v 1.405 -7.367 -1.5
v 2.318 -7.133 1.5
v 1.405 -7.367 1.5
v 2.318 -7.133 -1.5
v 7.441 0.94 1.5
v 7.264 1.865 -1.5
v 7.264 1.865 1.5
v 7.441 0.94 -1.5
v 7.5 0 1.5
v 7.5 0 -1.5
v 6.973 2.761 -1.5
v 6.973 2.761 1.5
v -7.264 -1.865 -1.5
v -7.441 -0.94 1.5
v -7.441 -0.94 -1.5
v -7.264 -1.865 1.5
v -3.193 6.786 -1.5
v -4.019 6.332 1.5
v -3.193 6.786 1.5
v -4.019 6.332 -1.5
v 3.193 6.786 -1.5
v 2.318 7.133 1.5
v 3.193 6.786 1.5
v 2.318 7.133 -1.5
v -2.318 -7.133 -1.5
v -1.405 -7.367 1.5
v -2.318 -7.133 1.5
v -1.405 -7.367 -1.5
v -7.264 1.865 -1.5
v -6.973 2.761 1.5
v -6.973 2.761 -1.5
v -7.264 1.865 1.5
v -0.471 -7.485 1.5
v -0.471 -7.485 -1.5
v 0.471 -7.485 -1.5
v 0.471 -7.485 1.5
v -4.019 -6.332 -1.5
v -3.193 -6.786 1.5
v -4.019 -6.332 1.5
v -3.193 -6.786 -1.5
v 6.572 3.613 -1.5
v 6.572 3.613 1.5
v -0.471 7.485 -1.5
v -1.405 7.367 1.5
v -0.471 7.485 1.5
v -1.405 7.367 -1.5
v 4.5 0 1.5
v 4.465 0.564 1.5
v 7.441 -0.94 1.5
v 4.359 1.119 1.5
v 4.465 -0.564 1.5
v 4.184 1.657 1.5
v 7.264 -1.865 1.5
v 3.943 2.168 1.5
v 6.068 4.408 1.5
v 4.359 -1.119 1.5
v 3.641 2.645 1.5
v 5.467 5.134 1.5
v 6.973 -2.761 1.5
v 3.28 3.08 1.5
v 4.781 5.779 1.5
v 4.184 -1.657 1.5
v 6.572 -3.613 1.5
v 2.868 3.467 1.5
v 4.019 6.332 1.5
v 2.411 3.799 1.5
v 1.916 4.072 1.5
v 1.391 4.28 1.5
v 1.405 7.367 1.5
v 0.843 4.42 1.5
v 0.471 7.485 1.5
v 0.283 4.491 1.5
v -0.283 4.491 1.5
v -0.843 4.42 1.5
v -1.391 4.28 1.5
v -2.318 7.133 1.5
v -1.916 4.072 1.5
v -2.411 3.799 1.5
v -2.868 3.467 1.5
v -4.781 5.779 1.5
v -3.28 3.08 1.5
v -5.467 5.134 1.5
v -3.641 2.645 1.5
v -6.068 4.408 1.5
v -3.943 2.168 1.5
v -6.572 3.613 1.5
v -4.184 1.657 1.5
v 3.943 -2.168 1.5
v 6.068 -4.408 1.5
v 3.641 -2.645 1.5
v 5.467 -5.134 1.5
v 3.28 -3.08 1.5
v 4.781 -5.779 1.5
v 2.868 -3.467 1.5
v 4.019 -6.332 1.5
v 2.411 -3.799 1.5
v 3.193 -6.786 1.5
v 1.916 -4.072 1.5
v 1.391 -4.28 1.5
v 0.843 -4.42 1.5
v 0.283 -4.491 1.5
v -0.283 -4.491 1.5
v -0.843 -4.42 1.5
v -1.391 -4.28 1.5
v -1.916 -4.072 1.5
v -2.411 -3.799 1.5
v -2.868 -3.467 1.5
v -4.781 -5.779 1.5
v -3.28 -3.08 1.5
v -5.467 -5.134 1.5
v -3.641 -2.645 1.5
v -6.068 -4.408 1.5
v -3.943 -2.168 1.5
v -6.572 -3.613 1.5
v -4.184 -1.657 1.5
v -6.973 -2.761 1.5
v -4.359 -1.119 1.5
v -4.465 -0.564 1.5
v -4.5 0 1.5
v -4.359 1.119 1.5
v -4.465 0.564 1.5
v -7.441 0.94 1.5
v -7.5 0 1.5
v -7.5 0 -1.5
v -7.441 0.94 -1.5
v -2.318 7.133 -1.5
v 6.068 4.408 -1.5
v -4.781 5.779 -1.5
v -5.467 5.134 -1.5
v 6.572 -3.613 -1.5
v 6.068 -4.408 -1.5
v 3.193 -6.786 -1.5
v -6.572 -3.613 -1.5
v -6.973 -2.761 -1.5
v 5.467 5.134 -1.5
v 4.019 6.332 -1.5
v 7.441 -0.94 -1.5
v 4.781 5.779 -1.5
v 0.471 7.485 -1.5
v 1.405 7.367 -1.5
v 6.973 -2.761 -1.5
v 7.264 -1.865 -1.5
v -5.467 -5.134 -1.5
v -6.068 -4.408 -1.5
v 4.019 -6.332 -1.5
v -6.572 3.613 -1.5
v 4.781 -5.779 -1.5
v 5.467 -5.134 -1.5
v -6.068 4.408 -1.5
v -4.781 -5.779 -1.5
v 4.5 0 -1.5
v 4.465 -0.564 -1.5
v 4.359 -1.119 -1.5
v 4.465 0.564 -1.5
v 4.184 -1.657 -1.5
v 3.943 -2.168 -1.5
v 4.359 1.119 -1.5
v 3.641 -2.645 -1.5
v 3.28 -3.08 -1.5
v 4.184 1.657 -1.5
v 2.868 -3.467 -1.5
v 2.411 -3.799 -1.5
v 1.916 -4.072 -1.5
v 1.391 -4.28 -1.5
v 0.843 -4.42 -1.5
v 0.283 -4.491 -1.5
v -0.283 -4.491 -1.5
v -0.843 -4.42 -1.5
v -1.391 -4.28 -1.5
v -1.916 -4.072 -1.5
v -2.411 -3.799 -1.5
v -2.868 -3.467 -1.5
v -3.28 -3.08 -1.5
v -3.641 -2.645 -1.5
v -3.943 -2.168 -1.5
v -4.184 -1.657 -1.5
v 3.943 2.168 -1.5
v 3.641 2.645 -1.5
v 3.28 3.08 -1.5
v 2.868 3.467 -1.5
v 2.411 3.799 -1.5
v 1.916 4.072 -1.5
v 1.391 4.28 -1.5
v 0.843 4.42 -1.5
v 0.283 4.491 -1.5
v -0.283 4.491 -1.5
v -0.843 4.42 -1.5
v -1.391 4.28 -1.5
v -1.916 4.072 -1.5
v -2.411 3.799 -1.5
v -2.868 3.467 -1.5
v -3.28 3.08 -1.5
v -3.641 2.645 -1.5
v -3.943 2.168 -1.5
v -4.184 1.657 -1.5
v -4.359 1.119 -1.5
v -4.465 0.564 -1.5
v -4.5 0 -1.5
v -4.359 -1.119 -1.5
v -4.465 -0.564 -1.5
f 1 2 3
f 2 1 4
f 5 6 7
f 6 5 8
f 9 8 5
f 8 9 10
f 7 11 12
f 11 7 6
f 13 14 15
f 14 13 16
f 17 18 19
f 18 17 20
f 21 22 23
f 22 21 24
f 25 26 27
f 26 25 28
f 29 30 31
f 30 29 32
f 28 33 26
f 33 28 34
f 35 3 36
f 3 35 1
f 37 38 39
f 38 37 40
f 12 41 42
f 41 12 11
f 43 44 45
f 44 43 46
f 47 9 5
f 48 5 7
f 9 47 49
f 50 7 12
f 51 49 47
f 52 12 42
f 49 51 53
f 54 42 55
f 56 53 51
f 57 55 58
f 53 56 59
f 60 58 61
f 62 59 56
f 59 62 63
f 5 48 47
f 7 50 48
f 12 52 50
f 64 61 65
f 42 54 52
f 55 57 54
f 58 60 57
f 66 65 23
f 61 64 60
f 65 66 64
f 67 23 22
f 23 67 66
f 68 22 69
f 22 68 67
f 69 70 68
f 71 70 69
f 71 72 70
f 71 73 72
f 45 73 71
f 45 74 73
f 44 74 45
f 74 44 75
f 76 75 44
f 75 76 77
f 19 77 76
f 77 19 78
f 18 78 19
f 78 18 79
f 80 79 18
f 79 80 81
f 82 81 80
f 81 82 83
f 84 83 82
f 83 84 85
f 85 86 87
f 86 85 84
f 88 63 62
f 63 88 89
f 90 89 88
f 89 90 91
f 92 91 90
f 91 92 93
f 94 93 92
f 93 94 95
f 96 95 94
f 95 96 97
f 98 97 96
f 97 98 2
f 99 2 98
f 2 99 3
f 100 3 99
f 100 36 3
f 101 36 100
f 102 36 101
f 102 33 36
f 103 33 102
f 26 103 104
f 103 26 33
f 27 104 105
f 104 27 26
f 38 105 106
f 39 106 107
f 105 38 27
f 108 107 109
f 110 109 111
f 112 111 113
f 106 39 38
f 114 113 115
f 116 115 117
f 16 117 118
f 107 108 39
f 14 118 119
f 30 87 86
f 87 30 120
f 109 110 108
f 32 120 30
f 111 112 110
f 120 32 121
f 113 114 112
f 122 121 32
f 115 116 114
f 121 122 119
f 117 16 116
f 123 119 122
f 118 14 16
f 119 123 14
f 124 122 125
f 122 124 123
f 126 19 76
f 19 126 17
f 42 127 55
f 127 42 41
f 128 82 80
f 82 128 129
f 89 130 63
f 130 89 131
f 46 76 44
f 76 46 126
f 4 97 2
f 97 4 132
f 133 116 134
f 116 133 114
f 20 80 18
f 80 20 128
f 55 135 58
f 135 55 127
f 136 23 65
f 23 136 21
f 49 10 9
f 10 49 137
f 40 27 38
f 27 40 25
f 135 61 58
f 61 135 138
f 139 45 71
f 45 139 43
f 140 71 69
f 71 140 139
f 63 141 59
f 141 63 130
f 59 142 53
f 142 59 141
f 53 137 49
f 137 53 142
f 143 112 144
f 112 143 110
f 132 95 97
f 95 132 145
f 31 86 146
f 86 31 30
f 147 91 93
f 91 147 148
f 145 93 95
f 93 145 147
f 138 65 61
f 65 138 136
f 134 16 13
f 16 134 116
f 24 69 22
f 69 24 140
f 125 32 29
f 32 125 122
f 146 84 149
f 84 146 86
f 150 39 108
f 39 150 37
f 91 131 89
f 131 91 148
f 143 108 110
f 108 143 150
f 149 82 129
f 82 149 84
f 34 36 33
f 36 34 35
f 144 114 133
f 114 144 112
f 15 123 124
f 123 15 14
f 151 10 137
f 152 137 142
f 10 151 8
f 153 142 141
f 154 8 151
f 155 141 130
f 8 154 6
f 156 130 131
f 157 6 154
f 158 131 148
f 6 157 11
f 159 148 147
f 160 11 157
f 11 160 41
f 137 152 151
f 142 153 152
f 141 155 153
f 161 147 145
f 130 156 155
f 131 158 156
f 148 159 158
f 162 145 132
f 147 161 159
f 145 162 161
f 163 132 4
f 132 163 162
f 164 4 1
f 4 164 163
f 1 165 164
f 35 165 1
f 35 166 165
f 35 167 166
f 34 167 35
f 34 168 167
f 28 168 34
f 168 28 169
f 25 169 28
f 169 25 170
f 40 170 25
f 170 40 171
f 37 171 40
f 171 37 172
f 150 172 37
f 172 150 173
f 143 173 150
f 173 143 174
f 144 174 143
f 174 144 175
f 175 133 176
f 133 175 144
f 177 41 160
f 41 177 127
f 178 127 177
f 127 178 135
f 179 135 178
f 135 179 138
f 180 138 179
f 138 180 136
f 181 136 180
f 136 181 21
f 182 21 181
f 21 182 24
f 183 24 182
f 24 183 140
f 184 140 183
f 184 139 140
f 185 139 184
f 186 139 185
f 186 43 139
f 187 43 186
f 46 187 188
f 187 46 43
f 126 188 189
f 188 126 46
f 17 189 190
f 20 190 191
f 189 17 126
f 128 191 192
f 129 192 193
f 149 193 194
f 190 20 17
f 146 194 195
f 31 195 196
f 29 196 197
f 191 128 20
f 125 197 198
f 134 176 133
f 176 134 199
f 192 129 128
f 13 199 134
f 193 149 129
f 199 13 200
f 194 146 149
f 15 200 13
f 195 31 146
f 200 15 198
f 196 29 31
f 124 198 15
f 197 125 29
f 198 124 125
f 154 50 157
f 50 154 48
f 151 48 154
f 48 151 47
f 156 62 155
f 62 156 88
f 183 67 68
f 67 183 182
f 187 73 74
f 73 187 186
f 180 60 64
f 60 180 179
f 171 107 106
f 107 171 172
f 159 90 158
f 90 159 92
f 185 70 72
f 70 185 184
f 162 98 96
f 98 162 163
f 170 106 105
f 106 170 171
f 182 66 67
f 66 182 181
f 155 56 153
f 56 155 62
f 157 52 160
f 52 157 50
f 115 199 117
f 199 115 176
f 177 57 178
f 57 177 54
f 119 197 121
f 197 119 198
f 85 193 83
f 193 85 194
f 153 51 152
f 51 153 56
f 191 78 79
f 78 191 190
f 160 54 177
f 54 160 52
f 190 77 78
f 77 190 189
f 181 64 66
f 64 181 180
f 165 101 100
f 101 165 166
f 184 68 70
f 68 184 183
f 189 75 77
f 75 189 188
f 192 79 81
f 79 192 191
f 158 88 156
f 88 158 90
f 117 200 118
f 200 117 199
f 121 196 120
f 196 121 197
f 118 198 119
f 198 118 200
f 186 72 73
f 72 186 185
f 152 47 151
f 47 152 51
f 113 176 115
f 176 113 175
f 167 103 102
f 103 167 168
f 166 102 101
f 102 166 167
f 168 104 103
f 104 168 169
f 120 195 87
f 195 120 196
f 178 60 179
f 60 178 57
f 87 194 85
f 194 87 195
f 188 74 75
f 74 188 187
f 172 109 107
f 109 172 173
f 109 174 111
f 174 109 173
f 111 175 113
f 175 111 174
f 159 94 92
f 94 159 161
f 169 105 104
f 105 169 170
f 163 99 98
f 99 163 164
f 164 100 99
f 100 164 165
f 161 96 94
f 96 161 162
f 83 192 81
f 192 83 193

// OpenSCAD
$fn = 50;


difference() {
	union() {
		translate(v = [0, 0, -1.5000000000]) {
			cylinder(h = 3, r = 7.5000000000);
		}
	}
	union() {
		translate(v = [0, 0, -100.0000000000]) {
			cylinder(h = 200, r = 4.5000000000);
		}
	}
}
